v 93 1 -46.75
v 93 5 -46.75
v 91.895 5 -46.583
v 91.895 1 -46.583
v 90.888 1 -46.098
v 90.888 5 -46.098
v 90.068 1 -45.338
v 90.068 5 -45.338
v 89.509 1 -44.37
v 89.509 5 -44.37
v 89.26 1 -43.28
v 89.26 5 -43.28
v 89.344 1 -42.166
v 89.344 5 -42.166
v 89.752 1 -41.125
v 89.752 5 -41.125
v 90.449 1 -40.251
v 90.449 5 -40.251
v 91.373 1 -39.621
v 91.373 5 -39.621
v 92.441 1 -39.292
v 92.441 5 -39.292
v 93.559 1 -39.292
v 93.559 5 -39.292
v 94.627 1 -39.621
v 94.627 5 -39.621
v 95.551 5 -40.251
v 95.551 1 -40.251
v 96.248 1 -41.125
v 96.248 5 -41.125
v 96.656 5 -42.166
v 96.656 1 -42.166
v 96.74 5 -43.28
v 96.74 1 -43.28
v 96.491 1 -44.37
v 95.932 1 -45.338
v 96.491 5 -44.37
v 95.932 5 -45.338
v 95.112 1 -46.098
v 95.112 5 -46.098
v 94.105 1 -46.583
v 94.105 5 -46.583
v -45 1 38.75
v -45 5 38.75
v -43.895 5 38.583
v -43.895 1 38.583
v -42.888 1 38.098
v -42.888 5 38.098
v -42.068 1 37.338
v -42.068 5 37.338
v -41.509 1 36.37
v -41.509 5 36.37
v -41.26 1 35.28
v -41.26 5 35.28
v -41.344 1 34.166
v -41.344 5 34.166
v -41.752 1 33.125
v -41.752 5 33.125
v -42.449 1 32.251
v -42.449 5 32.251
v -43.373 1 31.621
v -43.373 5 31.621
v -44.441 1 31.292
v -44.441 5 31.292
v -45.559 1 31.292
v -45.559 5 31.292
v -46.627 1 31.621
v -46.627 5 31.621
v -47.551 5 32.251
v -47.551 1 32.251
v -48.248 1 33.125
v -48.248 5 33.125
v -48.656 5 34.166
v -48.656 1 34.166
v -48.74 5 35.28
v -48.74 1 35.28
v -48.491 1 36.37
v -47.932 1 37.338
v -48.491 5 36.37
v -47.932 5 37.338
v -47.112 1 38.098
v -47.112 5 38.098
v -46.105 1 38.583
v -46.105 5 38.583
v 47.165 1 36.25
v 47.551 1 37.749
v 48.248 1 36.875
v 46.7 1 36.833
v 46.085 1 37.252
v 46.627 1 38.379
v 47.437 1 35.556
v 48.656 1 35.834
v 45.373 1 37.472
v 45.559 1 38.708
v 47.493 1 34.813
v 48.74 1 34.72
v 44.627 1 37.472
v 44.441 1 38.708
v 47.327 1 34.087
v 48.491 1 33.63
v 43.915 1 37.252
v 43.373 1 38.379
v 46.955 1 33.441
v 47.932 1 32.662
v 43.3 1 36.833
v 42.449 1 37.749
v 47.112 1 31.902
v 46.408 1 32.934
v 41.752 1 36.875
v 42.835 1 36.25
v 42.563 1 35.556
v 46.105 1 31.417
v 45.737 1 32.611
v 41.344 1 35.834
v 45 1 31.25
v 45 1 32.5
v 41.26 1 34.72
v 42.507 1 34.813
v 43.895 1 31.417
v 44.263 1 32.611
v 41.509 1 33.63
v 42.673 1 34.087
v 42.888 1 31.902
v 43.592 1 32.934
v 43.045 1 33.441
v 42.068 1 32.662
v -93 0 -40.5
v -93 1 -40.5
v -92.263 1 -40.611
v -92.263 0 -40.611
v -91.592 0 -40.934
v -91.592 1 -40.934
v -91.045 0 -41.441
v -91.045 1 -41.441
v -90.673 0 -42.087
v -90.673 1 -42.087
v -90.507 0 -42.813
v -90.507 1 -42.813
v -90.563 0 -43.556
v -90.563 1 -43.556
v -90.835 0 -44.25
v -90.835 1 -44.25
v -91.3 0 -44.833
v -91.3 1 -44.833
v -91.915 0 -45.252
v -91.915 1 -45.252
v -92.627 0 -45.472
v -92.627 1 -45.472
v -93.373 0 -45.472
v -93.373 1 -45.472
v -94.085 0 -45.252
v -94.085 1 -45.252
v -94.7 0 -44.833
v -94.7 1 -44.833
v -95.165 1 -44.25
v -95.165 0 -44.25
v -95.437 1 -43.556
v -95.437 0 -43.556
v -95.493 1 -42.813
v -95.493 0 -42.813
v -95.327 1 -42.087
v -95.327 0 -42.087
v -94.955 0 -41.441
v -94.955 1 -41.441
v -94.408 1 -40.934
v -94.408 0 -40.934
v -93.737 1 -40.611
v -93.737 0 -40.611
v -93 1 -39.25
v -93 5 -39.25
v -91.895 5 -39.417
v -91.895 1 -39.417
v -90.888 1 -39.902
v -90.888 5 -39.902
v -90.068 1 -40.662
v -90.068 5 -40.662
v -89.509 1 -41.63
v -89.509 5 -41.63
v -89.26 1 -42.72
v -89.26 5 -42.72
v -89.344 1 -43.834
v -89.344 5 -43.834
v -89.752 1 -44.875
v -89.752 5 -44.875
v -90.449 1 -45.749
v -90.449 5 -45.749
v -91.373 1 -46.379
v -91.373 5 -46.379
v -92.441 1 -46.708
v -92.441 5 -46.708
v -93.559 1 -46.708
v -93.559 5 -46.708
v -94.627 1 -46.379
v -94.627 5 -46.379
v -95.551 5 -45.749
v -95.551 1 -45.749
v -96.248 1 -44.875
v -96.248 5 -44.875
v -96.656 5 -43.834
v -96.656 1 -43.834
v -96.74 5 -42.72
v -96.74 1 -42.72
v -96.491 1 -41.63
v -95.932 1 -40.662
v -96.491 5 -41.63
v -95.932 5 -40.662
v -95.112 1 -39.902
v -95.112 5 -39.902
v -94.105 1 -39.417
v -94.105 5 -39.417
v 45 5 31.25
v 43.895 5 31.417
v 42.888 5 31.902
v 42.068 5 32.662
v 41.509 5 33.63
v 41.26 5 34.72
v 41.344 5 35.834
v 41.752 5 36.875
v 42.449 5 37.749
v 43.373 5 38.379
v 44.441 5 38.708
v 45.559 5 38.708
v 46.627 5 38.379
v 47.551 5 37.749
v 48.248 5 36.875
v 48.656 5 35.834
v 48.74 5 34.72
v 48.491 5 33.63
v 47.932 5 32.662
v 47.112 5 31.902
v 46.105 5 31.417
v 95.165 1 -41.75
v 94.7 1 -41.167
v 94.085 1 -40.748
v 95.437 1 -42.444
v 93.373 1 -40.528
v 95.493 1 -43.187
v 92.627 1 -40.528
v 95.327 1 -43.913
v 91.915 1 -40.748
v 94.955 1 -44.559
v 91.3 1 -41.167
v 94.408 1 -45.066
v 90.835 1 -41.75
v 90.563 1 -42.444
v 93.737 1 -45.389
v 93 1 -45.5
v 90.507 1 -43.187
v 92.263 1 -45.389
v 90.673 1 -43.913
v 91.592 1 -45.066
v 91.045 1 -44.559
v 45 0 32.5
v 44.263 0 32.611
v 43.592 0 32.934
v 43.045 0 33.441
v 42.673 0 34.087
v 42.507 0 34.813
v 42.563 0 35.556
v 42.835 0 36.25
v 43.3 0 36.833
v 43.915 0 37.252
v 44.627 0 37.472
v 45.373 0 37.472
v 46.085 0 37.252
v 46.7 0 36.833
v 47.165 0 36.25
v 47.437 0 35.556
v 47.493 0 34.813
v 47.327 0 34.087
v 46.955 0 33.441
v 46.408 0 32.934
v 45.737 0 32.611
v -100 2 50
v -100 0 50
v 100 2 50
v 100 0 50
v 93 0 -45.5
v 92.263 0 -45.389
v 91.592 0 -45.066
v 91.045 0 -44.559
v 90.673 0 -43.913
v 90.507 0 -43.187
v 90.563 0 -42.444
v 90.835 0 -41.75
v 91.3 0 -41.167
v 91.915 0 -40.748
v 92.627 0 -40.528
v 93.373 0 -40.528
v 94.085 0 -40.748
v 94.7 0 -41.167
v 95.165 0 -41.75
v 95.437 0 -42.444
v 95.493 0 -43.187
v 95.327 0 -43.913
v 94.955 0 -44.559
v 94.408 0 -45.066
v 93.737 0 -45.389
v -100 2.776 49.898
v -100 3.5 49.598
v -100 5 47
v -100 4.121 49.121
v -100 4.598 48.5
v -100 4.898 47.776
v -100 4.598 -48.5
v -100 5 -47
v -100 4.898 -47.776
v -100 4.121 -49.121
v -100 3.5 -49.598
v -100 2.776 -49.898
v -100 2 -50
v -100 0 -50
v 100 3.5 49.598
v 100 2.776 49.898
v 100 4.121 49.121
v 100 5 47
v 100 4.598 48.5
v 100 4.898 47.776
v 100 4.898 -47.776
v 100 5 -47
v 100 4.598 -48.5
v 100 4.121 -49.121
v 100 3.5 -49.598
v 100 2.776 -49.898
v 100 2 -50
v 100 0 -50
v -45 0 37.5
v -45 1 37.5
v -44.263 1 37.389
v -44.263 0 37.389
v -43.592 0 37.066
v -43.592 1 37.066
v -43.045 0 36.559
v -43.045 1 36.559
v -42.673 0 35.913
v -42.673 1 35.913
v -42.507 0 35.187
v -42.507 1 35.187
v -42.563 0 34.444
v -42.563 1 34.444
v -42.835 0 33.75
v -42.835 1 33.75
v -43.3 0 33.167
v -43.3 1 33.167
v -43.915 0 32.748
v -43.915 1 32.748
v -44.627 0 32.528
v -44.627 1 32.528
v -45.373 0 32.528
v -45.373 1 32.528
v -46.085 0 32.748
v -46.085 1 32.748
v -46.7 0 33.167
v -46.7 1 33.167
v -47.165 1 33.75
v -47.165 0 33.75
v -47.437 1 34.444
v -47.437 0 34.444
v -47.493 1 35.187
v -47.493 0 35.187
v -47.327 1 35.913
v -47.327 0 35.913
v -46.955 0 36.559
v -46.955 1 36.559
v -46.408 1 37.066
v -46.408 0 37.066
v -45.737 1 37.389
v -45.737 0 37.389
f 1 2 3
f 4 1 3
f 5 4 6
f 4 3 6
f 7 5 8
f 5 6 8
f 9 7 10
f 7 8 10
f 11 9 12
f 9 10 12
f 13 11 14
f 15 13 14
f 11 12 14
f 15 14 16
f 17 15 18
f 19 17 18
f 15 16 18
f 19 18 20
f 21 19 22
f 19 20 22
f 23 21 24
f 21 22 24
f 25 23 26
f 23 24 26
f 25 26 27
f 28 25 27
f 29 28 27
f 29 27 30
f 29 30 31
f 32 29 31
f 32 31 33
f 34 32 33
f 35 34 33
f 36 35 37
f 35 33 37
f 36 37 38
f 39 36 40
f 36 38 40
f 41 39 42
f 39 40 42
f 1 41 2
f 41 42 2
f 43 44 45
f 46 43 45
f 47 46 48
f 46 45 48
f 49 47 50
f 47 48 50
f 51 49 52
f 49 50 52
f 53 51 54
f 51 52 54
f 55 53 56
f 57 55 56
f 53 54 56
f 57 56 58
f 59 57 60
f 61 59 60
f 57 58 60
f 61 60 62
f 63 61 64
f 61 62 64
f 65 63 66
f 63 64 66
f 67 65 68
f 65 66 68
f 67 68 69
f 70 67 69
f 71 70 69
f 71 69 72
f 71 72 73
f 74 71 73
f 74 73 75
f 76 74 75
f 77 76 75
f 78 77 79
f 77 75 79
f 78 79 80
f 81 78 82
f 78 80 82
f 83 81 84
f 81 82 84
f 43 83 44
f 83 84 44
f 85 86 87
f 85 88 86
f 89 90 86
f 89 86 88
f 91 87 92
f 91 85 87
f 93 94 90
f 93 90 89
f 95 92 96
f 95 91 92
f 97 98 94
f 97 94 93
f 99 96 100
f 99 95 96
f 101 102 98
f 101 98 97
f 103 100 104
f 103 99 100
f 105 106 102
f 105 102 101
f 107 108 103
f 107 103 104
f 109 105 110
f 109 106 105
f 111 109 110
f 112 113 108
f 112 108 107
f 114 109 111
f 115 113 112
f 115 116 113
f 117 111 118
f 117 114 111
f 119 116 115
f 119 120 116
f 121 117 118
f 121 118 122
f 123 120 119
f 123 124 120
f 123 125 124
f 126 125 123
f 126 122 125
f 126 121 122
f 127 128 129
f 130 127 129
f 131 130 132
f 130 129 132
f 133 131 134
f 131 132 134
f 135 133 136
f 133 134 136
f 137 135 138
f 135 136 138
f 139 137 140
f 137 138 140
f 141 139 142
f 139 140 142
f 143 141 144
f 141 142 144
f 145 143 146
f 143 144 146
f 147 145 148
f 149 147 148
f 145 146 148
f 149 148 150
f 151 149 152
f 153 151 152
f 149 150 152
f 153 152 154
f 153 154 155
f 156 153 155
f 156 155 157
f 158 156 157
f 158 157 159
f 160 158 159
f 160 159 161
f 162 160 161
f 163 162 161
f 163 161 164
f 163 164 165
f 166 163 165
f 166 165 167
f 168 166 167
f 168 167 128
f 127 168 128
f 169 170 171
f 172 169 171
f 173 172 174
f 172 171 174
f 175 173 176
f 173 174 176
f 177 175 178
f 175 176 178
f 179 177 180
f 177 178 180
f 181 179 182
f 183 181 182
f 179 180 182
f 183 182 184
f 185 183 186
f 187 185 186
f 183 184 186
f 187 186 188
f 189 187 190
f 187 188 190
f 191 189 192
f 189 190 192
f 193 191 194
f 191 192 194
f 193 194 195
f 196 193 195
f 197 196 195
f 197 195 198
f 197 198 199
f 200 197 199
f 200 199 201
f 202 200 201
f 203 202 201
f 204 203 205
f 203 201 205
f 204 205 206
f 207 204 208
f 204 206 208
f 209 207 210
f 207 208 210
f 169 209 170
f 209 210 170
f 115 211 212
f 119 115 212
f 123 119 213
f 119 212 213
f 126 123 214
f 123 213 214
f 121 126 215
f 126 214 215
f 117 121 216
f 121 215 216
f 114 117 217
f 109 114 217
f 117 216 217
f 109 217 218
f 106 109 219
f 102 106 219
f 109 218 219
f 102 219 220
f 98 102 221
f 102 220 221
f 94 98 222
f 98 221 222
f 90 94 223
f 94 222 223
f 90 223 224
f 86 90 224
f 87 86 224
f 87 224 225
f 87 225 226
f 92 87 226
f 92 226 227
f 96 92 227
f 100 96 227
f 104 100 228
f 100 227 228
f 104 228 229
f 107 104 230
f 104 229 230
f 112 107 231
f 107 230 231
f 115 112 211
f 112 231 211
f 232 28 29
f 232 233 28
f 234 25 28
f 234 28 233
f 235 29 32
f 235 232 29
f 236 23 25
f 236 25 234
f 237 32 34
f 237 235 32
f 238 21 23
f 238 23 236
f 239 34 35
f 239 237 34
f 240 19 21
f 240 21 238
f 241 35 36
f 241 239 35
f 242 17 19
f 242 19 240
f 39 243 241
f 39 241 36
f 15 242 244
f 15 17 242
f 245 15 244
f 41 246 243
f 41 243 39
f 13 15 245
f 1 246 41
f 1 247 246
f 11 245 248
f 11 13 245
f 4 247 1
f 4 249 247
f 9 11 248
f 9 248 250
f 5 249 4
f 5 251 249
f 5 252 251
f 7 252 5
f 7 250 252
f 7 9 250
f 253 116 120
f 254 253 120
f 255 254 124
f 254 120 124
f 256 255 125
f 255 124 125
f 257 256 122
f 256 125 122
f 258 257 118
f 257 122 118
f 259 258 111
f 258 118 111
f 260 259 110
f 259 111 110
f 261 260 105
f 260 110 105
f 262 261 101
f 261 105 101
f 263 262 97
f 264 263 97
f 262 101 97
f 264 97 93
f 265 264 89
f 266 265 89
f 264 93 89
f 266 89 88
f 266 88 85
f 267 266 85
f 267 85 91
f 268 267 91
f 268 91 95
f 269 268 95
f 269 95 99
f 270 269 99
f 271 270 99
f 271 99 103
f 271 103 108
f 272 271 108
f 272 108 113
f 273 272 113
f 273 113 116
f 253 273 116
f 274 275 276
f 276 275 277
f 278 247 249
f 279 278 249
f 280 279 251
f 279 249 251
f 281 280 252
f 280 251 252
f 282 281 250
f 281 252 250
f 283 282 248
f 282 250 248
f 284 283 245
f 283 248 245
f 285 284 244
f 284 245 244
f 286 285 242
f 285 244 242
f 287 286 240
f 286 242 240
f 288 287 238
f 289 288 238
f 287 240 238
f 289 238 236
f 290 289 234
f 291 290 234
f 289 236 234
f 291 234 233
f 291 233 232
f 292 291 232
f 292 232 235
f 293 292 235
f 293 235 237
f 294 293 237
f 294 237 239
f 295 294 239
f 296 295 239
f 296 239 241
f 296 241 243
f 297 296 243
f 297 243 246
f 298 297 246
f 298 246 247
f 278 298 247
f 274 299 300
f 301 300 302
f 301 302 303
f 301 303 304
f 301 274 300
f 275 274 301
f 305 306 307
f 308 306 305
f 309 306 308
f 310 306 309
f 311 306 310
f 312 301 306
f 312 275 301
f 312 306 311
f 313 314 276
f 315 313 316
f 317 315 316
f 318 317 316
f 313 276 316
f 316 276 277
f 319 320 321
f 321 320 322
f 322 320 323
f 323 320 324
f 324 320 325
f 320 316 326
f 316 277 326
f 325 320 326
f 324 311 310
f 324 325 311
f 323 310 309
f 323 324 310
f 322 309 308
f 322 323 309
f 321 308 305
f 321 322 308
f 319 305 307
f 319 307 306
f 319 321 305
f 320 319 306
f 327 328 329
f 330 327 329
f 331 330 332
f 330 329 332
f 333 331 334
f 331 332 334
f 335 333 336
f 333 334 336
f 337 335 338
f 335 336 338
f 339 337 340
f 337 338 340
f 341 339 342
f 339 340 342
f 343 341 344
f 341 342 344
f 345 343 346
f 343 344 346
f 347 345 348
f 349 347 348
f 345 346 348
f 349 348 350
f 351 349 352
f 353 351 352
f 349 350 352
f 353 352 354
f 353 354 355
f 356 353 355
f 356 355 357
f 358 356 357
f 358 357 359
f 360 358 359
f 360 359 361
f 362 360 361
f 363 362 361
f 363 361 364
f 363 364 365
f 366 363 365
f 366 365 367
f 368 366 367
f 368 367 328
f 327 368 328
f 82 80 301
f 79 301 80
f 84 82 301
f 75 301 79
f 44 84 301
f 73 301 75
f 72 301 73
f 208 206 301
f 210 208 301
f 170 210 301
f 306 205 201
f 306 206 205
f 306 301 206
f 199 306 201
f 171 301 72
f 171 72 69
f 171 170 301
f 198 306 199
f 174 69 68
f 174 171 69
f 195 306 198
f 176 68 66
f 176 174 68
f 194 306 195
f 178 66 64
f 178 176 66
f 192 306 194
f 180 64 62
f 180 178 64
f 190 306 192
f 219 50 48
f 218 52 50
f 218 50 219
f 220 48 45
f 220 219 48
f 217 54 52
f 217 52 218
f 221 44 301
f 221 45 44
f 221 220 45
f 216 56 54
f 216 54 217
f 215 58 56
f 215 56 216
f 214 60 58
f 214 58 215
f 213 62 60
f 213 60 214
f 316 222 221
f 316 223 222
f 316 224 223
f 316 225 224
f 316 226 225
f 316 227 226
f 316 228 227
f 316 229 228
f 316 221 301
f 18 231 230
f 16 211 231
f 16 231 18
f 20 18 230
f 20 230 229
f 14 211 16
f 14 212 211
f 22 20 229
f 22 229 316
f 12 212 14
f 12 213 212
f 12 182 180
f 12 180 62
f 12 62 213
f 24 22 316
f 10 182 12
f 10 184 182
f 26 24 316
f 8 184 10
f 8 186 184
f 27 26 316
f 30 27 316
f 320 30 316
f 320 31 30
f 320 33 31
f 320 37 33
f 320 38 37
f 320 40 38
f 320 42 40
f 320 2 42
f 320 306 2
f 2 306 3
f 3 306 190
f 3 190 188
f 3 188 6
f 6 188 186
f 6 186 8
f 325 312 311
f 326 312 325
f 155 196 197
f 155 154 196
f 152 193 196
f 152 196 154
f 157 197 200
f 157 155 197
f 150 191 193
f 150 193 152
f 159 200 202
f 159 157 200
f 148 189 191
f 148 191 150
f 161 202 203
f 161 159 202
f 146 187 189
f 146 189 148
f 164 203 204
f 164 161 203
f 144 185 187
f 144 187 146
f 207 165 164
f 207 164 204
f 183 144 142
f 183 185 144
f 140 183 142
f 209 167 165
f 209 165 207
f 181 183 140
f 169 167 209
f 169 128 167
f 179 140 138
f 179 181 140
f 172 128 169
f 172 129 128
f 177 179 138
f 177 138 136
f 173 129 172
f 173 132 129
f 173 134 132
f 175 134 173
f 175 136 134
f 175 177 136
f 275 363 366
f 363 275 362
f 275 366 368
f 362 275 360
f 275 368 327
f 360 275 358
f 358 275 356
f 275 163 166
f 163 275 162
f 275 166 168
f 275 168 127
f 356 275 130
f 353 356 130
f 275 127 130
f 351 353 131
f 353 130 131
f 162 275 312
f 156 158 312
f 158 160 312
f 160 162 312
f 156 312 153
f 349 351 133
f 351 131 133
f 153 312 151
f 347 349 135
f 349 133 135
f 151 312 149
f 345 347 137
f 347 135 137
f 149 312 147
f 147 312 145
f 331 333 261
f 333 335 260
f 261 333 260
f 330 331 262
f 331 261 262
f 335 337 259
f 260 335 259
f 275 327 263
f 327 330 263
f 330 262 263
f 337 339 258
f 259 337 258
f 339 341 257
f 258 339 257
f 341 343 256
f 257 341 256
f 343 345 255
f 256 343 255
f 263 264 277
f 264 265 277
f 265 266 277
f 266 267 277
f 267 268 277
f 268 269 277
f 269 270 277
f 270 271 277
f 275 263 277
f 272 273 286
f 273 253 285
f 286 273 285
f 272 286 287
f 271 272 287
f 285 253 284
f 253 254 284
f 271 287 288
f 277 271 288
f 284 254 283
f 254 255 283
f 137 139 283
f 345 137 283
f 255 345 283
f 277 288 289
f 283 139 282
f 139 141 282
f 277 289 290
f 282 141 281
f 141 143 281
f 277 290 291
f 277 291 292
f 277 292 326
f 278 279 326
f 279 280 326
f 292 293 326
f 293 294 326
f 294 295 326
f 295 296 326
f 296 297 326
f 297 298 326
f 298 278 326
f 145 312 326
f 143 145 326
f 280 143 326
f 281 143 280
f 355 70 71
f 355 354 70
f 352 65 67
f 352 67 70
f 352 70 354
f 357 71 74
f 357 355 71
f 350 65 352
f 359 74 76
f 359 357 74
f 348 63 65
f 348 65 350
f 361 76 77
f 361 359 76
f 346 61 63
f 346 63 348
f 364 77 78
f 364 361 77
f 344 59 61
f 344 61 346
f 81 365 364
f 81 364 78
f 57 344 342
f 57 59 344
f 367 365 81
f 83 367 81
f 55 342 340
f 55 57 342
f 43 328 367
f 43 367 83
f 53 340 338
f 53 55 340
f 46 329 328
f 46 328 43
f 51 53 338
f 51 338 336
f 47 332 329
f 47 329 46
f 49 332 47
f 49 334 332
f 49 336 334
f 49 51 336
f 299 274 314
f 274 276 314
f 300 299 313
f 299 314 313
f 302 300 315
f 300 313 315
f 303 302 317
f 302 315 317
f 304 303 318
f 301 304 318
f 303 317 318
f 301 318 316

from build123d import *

# Parameters (mm, degrees)
SKETCH1_W           = 200
SKETCH1_H           = 100
BOSS_EXTRUDE1_DEPTH = 5
SKETCH2_R           = 2.5
CUT_EXTRUDE1_DEPTH  = 112.915146428
SKETCH3_R           = 3.75
CUT_EXTRUDE2_DEPTH  = 4
FILLET1_R           = 3


with BuildPart() as part:
    # Sketch1 → Boss-Extrude1 (new body)
    with BuildSketch(Plane(origin=(0, 0, 0), x_dir=(1, 0, 0), z_dir=(0, 1, 0))):
        Rectangle(SKETCH1_W, SKETCH1_H)
    extrude(amount=BOSS_EXTRUDE1_DEPTH)

    # Sketch2 → Cut-Extrude1 (cut, through all)
    with BuildSketch(Plane(origin=(0, 5, 0), x_dir=(1, 0, 0), z_dir=(0, 1, 0))):
        with Locations(Location((-93, 43, 0), (0, 0, 270))):
            Circle(SKETCH2_R)
        with Locations(Location((-45, -35, 0), (0, 0, 270))):
            Circle(SKETCH2_R)
        with Locations(Location((93, 43, 0), (0, 0, 90))):
            Circle(SKETCH2_R)
        with Locations(Location((45, -35, 0), (0, 0, 90))):
            Circle(SKETCH2_R)
    extrude(amount=-CUT_EXTRUDE1_DEPTH, mode=Mode.SUBTRACT)

    # Sketch3 → Cut-Extrude2 (cut)
    with BuildSketch(Plane(origin=(0, 5, 0), x_dir=(1, 0, 0), z_dir=(0, 1, 0))):
        with Locations(Location((-93, 43, 0), (0, 0, 270))):
            Circle(SKETCH3_R)
        with Locations(Location((-45, -35, 0), (0, 0, 270))):
            Circle(SKETCH3_R)
        with Locations(Location((45, -35, 0), (0, 0, 90))):
            Circle(SKETCH3_R)
        with Locations(Location((93, 43, 0), (0, 0, 90))):
            Circle(SKETCH3_R)
    extrude(amount=-CUT_EXTRUDE2_DEPTH, mode=Mode.SUBTRACT)

    # Fillet1
    fillet1_edges = [part.edges().sort_by_distance(p)[0] for p in [
        (0, 5, 50),
        (0, 5, -50),
    ]]
    fillet(fillet1_edges, radius=FILLET1_R)


solid = part.part
